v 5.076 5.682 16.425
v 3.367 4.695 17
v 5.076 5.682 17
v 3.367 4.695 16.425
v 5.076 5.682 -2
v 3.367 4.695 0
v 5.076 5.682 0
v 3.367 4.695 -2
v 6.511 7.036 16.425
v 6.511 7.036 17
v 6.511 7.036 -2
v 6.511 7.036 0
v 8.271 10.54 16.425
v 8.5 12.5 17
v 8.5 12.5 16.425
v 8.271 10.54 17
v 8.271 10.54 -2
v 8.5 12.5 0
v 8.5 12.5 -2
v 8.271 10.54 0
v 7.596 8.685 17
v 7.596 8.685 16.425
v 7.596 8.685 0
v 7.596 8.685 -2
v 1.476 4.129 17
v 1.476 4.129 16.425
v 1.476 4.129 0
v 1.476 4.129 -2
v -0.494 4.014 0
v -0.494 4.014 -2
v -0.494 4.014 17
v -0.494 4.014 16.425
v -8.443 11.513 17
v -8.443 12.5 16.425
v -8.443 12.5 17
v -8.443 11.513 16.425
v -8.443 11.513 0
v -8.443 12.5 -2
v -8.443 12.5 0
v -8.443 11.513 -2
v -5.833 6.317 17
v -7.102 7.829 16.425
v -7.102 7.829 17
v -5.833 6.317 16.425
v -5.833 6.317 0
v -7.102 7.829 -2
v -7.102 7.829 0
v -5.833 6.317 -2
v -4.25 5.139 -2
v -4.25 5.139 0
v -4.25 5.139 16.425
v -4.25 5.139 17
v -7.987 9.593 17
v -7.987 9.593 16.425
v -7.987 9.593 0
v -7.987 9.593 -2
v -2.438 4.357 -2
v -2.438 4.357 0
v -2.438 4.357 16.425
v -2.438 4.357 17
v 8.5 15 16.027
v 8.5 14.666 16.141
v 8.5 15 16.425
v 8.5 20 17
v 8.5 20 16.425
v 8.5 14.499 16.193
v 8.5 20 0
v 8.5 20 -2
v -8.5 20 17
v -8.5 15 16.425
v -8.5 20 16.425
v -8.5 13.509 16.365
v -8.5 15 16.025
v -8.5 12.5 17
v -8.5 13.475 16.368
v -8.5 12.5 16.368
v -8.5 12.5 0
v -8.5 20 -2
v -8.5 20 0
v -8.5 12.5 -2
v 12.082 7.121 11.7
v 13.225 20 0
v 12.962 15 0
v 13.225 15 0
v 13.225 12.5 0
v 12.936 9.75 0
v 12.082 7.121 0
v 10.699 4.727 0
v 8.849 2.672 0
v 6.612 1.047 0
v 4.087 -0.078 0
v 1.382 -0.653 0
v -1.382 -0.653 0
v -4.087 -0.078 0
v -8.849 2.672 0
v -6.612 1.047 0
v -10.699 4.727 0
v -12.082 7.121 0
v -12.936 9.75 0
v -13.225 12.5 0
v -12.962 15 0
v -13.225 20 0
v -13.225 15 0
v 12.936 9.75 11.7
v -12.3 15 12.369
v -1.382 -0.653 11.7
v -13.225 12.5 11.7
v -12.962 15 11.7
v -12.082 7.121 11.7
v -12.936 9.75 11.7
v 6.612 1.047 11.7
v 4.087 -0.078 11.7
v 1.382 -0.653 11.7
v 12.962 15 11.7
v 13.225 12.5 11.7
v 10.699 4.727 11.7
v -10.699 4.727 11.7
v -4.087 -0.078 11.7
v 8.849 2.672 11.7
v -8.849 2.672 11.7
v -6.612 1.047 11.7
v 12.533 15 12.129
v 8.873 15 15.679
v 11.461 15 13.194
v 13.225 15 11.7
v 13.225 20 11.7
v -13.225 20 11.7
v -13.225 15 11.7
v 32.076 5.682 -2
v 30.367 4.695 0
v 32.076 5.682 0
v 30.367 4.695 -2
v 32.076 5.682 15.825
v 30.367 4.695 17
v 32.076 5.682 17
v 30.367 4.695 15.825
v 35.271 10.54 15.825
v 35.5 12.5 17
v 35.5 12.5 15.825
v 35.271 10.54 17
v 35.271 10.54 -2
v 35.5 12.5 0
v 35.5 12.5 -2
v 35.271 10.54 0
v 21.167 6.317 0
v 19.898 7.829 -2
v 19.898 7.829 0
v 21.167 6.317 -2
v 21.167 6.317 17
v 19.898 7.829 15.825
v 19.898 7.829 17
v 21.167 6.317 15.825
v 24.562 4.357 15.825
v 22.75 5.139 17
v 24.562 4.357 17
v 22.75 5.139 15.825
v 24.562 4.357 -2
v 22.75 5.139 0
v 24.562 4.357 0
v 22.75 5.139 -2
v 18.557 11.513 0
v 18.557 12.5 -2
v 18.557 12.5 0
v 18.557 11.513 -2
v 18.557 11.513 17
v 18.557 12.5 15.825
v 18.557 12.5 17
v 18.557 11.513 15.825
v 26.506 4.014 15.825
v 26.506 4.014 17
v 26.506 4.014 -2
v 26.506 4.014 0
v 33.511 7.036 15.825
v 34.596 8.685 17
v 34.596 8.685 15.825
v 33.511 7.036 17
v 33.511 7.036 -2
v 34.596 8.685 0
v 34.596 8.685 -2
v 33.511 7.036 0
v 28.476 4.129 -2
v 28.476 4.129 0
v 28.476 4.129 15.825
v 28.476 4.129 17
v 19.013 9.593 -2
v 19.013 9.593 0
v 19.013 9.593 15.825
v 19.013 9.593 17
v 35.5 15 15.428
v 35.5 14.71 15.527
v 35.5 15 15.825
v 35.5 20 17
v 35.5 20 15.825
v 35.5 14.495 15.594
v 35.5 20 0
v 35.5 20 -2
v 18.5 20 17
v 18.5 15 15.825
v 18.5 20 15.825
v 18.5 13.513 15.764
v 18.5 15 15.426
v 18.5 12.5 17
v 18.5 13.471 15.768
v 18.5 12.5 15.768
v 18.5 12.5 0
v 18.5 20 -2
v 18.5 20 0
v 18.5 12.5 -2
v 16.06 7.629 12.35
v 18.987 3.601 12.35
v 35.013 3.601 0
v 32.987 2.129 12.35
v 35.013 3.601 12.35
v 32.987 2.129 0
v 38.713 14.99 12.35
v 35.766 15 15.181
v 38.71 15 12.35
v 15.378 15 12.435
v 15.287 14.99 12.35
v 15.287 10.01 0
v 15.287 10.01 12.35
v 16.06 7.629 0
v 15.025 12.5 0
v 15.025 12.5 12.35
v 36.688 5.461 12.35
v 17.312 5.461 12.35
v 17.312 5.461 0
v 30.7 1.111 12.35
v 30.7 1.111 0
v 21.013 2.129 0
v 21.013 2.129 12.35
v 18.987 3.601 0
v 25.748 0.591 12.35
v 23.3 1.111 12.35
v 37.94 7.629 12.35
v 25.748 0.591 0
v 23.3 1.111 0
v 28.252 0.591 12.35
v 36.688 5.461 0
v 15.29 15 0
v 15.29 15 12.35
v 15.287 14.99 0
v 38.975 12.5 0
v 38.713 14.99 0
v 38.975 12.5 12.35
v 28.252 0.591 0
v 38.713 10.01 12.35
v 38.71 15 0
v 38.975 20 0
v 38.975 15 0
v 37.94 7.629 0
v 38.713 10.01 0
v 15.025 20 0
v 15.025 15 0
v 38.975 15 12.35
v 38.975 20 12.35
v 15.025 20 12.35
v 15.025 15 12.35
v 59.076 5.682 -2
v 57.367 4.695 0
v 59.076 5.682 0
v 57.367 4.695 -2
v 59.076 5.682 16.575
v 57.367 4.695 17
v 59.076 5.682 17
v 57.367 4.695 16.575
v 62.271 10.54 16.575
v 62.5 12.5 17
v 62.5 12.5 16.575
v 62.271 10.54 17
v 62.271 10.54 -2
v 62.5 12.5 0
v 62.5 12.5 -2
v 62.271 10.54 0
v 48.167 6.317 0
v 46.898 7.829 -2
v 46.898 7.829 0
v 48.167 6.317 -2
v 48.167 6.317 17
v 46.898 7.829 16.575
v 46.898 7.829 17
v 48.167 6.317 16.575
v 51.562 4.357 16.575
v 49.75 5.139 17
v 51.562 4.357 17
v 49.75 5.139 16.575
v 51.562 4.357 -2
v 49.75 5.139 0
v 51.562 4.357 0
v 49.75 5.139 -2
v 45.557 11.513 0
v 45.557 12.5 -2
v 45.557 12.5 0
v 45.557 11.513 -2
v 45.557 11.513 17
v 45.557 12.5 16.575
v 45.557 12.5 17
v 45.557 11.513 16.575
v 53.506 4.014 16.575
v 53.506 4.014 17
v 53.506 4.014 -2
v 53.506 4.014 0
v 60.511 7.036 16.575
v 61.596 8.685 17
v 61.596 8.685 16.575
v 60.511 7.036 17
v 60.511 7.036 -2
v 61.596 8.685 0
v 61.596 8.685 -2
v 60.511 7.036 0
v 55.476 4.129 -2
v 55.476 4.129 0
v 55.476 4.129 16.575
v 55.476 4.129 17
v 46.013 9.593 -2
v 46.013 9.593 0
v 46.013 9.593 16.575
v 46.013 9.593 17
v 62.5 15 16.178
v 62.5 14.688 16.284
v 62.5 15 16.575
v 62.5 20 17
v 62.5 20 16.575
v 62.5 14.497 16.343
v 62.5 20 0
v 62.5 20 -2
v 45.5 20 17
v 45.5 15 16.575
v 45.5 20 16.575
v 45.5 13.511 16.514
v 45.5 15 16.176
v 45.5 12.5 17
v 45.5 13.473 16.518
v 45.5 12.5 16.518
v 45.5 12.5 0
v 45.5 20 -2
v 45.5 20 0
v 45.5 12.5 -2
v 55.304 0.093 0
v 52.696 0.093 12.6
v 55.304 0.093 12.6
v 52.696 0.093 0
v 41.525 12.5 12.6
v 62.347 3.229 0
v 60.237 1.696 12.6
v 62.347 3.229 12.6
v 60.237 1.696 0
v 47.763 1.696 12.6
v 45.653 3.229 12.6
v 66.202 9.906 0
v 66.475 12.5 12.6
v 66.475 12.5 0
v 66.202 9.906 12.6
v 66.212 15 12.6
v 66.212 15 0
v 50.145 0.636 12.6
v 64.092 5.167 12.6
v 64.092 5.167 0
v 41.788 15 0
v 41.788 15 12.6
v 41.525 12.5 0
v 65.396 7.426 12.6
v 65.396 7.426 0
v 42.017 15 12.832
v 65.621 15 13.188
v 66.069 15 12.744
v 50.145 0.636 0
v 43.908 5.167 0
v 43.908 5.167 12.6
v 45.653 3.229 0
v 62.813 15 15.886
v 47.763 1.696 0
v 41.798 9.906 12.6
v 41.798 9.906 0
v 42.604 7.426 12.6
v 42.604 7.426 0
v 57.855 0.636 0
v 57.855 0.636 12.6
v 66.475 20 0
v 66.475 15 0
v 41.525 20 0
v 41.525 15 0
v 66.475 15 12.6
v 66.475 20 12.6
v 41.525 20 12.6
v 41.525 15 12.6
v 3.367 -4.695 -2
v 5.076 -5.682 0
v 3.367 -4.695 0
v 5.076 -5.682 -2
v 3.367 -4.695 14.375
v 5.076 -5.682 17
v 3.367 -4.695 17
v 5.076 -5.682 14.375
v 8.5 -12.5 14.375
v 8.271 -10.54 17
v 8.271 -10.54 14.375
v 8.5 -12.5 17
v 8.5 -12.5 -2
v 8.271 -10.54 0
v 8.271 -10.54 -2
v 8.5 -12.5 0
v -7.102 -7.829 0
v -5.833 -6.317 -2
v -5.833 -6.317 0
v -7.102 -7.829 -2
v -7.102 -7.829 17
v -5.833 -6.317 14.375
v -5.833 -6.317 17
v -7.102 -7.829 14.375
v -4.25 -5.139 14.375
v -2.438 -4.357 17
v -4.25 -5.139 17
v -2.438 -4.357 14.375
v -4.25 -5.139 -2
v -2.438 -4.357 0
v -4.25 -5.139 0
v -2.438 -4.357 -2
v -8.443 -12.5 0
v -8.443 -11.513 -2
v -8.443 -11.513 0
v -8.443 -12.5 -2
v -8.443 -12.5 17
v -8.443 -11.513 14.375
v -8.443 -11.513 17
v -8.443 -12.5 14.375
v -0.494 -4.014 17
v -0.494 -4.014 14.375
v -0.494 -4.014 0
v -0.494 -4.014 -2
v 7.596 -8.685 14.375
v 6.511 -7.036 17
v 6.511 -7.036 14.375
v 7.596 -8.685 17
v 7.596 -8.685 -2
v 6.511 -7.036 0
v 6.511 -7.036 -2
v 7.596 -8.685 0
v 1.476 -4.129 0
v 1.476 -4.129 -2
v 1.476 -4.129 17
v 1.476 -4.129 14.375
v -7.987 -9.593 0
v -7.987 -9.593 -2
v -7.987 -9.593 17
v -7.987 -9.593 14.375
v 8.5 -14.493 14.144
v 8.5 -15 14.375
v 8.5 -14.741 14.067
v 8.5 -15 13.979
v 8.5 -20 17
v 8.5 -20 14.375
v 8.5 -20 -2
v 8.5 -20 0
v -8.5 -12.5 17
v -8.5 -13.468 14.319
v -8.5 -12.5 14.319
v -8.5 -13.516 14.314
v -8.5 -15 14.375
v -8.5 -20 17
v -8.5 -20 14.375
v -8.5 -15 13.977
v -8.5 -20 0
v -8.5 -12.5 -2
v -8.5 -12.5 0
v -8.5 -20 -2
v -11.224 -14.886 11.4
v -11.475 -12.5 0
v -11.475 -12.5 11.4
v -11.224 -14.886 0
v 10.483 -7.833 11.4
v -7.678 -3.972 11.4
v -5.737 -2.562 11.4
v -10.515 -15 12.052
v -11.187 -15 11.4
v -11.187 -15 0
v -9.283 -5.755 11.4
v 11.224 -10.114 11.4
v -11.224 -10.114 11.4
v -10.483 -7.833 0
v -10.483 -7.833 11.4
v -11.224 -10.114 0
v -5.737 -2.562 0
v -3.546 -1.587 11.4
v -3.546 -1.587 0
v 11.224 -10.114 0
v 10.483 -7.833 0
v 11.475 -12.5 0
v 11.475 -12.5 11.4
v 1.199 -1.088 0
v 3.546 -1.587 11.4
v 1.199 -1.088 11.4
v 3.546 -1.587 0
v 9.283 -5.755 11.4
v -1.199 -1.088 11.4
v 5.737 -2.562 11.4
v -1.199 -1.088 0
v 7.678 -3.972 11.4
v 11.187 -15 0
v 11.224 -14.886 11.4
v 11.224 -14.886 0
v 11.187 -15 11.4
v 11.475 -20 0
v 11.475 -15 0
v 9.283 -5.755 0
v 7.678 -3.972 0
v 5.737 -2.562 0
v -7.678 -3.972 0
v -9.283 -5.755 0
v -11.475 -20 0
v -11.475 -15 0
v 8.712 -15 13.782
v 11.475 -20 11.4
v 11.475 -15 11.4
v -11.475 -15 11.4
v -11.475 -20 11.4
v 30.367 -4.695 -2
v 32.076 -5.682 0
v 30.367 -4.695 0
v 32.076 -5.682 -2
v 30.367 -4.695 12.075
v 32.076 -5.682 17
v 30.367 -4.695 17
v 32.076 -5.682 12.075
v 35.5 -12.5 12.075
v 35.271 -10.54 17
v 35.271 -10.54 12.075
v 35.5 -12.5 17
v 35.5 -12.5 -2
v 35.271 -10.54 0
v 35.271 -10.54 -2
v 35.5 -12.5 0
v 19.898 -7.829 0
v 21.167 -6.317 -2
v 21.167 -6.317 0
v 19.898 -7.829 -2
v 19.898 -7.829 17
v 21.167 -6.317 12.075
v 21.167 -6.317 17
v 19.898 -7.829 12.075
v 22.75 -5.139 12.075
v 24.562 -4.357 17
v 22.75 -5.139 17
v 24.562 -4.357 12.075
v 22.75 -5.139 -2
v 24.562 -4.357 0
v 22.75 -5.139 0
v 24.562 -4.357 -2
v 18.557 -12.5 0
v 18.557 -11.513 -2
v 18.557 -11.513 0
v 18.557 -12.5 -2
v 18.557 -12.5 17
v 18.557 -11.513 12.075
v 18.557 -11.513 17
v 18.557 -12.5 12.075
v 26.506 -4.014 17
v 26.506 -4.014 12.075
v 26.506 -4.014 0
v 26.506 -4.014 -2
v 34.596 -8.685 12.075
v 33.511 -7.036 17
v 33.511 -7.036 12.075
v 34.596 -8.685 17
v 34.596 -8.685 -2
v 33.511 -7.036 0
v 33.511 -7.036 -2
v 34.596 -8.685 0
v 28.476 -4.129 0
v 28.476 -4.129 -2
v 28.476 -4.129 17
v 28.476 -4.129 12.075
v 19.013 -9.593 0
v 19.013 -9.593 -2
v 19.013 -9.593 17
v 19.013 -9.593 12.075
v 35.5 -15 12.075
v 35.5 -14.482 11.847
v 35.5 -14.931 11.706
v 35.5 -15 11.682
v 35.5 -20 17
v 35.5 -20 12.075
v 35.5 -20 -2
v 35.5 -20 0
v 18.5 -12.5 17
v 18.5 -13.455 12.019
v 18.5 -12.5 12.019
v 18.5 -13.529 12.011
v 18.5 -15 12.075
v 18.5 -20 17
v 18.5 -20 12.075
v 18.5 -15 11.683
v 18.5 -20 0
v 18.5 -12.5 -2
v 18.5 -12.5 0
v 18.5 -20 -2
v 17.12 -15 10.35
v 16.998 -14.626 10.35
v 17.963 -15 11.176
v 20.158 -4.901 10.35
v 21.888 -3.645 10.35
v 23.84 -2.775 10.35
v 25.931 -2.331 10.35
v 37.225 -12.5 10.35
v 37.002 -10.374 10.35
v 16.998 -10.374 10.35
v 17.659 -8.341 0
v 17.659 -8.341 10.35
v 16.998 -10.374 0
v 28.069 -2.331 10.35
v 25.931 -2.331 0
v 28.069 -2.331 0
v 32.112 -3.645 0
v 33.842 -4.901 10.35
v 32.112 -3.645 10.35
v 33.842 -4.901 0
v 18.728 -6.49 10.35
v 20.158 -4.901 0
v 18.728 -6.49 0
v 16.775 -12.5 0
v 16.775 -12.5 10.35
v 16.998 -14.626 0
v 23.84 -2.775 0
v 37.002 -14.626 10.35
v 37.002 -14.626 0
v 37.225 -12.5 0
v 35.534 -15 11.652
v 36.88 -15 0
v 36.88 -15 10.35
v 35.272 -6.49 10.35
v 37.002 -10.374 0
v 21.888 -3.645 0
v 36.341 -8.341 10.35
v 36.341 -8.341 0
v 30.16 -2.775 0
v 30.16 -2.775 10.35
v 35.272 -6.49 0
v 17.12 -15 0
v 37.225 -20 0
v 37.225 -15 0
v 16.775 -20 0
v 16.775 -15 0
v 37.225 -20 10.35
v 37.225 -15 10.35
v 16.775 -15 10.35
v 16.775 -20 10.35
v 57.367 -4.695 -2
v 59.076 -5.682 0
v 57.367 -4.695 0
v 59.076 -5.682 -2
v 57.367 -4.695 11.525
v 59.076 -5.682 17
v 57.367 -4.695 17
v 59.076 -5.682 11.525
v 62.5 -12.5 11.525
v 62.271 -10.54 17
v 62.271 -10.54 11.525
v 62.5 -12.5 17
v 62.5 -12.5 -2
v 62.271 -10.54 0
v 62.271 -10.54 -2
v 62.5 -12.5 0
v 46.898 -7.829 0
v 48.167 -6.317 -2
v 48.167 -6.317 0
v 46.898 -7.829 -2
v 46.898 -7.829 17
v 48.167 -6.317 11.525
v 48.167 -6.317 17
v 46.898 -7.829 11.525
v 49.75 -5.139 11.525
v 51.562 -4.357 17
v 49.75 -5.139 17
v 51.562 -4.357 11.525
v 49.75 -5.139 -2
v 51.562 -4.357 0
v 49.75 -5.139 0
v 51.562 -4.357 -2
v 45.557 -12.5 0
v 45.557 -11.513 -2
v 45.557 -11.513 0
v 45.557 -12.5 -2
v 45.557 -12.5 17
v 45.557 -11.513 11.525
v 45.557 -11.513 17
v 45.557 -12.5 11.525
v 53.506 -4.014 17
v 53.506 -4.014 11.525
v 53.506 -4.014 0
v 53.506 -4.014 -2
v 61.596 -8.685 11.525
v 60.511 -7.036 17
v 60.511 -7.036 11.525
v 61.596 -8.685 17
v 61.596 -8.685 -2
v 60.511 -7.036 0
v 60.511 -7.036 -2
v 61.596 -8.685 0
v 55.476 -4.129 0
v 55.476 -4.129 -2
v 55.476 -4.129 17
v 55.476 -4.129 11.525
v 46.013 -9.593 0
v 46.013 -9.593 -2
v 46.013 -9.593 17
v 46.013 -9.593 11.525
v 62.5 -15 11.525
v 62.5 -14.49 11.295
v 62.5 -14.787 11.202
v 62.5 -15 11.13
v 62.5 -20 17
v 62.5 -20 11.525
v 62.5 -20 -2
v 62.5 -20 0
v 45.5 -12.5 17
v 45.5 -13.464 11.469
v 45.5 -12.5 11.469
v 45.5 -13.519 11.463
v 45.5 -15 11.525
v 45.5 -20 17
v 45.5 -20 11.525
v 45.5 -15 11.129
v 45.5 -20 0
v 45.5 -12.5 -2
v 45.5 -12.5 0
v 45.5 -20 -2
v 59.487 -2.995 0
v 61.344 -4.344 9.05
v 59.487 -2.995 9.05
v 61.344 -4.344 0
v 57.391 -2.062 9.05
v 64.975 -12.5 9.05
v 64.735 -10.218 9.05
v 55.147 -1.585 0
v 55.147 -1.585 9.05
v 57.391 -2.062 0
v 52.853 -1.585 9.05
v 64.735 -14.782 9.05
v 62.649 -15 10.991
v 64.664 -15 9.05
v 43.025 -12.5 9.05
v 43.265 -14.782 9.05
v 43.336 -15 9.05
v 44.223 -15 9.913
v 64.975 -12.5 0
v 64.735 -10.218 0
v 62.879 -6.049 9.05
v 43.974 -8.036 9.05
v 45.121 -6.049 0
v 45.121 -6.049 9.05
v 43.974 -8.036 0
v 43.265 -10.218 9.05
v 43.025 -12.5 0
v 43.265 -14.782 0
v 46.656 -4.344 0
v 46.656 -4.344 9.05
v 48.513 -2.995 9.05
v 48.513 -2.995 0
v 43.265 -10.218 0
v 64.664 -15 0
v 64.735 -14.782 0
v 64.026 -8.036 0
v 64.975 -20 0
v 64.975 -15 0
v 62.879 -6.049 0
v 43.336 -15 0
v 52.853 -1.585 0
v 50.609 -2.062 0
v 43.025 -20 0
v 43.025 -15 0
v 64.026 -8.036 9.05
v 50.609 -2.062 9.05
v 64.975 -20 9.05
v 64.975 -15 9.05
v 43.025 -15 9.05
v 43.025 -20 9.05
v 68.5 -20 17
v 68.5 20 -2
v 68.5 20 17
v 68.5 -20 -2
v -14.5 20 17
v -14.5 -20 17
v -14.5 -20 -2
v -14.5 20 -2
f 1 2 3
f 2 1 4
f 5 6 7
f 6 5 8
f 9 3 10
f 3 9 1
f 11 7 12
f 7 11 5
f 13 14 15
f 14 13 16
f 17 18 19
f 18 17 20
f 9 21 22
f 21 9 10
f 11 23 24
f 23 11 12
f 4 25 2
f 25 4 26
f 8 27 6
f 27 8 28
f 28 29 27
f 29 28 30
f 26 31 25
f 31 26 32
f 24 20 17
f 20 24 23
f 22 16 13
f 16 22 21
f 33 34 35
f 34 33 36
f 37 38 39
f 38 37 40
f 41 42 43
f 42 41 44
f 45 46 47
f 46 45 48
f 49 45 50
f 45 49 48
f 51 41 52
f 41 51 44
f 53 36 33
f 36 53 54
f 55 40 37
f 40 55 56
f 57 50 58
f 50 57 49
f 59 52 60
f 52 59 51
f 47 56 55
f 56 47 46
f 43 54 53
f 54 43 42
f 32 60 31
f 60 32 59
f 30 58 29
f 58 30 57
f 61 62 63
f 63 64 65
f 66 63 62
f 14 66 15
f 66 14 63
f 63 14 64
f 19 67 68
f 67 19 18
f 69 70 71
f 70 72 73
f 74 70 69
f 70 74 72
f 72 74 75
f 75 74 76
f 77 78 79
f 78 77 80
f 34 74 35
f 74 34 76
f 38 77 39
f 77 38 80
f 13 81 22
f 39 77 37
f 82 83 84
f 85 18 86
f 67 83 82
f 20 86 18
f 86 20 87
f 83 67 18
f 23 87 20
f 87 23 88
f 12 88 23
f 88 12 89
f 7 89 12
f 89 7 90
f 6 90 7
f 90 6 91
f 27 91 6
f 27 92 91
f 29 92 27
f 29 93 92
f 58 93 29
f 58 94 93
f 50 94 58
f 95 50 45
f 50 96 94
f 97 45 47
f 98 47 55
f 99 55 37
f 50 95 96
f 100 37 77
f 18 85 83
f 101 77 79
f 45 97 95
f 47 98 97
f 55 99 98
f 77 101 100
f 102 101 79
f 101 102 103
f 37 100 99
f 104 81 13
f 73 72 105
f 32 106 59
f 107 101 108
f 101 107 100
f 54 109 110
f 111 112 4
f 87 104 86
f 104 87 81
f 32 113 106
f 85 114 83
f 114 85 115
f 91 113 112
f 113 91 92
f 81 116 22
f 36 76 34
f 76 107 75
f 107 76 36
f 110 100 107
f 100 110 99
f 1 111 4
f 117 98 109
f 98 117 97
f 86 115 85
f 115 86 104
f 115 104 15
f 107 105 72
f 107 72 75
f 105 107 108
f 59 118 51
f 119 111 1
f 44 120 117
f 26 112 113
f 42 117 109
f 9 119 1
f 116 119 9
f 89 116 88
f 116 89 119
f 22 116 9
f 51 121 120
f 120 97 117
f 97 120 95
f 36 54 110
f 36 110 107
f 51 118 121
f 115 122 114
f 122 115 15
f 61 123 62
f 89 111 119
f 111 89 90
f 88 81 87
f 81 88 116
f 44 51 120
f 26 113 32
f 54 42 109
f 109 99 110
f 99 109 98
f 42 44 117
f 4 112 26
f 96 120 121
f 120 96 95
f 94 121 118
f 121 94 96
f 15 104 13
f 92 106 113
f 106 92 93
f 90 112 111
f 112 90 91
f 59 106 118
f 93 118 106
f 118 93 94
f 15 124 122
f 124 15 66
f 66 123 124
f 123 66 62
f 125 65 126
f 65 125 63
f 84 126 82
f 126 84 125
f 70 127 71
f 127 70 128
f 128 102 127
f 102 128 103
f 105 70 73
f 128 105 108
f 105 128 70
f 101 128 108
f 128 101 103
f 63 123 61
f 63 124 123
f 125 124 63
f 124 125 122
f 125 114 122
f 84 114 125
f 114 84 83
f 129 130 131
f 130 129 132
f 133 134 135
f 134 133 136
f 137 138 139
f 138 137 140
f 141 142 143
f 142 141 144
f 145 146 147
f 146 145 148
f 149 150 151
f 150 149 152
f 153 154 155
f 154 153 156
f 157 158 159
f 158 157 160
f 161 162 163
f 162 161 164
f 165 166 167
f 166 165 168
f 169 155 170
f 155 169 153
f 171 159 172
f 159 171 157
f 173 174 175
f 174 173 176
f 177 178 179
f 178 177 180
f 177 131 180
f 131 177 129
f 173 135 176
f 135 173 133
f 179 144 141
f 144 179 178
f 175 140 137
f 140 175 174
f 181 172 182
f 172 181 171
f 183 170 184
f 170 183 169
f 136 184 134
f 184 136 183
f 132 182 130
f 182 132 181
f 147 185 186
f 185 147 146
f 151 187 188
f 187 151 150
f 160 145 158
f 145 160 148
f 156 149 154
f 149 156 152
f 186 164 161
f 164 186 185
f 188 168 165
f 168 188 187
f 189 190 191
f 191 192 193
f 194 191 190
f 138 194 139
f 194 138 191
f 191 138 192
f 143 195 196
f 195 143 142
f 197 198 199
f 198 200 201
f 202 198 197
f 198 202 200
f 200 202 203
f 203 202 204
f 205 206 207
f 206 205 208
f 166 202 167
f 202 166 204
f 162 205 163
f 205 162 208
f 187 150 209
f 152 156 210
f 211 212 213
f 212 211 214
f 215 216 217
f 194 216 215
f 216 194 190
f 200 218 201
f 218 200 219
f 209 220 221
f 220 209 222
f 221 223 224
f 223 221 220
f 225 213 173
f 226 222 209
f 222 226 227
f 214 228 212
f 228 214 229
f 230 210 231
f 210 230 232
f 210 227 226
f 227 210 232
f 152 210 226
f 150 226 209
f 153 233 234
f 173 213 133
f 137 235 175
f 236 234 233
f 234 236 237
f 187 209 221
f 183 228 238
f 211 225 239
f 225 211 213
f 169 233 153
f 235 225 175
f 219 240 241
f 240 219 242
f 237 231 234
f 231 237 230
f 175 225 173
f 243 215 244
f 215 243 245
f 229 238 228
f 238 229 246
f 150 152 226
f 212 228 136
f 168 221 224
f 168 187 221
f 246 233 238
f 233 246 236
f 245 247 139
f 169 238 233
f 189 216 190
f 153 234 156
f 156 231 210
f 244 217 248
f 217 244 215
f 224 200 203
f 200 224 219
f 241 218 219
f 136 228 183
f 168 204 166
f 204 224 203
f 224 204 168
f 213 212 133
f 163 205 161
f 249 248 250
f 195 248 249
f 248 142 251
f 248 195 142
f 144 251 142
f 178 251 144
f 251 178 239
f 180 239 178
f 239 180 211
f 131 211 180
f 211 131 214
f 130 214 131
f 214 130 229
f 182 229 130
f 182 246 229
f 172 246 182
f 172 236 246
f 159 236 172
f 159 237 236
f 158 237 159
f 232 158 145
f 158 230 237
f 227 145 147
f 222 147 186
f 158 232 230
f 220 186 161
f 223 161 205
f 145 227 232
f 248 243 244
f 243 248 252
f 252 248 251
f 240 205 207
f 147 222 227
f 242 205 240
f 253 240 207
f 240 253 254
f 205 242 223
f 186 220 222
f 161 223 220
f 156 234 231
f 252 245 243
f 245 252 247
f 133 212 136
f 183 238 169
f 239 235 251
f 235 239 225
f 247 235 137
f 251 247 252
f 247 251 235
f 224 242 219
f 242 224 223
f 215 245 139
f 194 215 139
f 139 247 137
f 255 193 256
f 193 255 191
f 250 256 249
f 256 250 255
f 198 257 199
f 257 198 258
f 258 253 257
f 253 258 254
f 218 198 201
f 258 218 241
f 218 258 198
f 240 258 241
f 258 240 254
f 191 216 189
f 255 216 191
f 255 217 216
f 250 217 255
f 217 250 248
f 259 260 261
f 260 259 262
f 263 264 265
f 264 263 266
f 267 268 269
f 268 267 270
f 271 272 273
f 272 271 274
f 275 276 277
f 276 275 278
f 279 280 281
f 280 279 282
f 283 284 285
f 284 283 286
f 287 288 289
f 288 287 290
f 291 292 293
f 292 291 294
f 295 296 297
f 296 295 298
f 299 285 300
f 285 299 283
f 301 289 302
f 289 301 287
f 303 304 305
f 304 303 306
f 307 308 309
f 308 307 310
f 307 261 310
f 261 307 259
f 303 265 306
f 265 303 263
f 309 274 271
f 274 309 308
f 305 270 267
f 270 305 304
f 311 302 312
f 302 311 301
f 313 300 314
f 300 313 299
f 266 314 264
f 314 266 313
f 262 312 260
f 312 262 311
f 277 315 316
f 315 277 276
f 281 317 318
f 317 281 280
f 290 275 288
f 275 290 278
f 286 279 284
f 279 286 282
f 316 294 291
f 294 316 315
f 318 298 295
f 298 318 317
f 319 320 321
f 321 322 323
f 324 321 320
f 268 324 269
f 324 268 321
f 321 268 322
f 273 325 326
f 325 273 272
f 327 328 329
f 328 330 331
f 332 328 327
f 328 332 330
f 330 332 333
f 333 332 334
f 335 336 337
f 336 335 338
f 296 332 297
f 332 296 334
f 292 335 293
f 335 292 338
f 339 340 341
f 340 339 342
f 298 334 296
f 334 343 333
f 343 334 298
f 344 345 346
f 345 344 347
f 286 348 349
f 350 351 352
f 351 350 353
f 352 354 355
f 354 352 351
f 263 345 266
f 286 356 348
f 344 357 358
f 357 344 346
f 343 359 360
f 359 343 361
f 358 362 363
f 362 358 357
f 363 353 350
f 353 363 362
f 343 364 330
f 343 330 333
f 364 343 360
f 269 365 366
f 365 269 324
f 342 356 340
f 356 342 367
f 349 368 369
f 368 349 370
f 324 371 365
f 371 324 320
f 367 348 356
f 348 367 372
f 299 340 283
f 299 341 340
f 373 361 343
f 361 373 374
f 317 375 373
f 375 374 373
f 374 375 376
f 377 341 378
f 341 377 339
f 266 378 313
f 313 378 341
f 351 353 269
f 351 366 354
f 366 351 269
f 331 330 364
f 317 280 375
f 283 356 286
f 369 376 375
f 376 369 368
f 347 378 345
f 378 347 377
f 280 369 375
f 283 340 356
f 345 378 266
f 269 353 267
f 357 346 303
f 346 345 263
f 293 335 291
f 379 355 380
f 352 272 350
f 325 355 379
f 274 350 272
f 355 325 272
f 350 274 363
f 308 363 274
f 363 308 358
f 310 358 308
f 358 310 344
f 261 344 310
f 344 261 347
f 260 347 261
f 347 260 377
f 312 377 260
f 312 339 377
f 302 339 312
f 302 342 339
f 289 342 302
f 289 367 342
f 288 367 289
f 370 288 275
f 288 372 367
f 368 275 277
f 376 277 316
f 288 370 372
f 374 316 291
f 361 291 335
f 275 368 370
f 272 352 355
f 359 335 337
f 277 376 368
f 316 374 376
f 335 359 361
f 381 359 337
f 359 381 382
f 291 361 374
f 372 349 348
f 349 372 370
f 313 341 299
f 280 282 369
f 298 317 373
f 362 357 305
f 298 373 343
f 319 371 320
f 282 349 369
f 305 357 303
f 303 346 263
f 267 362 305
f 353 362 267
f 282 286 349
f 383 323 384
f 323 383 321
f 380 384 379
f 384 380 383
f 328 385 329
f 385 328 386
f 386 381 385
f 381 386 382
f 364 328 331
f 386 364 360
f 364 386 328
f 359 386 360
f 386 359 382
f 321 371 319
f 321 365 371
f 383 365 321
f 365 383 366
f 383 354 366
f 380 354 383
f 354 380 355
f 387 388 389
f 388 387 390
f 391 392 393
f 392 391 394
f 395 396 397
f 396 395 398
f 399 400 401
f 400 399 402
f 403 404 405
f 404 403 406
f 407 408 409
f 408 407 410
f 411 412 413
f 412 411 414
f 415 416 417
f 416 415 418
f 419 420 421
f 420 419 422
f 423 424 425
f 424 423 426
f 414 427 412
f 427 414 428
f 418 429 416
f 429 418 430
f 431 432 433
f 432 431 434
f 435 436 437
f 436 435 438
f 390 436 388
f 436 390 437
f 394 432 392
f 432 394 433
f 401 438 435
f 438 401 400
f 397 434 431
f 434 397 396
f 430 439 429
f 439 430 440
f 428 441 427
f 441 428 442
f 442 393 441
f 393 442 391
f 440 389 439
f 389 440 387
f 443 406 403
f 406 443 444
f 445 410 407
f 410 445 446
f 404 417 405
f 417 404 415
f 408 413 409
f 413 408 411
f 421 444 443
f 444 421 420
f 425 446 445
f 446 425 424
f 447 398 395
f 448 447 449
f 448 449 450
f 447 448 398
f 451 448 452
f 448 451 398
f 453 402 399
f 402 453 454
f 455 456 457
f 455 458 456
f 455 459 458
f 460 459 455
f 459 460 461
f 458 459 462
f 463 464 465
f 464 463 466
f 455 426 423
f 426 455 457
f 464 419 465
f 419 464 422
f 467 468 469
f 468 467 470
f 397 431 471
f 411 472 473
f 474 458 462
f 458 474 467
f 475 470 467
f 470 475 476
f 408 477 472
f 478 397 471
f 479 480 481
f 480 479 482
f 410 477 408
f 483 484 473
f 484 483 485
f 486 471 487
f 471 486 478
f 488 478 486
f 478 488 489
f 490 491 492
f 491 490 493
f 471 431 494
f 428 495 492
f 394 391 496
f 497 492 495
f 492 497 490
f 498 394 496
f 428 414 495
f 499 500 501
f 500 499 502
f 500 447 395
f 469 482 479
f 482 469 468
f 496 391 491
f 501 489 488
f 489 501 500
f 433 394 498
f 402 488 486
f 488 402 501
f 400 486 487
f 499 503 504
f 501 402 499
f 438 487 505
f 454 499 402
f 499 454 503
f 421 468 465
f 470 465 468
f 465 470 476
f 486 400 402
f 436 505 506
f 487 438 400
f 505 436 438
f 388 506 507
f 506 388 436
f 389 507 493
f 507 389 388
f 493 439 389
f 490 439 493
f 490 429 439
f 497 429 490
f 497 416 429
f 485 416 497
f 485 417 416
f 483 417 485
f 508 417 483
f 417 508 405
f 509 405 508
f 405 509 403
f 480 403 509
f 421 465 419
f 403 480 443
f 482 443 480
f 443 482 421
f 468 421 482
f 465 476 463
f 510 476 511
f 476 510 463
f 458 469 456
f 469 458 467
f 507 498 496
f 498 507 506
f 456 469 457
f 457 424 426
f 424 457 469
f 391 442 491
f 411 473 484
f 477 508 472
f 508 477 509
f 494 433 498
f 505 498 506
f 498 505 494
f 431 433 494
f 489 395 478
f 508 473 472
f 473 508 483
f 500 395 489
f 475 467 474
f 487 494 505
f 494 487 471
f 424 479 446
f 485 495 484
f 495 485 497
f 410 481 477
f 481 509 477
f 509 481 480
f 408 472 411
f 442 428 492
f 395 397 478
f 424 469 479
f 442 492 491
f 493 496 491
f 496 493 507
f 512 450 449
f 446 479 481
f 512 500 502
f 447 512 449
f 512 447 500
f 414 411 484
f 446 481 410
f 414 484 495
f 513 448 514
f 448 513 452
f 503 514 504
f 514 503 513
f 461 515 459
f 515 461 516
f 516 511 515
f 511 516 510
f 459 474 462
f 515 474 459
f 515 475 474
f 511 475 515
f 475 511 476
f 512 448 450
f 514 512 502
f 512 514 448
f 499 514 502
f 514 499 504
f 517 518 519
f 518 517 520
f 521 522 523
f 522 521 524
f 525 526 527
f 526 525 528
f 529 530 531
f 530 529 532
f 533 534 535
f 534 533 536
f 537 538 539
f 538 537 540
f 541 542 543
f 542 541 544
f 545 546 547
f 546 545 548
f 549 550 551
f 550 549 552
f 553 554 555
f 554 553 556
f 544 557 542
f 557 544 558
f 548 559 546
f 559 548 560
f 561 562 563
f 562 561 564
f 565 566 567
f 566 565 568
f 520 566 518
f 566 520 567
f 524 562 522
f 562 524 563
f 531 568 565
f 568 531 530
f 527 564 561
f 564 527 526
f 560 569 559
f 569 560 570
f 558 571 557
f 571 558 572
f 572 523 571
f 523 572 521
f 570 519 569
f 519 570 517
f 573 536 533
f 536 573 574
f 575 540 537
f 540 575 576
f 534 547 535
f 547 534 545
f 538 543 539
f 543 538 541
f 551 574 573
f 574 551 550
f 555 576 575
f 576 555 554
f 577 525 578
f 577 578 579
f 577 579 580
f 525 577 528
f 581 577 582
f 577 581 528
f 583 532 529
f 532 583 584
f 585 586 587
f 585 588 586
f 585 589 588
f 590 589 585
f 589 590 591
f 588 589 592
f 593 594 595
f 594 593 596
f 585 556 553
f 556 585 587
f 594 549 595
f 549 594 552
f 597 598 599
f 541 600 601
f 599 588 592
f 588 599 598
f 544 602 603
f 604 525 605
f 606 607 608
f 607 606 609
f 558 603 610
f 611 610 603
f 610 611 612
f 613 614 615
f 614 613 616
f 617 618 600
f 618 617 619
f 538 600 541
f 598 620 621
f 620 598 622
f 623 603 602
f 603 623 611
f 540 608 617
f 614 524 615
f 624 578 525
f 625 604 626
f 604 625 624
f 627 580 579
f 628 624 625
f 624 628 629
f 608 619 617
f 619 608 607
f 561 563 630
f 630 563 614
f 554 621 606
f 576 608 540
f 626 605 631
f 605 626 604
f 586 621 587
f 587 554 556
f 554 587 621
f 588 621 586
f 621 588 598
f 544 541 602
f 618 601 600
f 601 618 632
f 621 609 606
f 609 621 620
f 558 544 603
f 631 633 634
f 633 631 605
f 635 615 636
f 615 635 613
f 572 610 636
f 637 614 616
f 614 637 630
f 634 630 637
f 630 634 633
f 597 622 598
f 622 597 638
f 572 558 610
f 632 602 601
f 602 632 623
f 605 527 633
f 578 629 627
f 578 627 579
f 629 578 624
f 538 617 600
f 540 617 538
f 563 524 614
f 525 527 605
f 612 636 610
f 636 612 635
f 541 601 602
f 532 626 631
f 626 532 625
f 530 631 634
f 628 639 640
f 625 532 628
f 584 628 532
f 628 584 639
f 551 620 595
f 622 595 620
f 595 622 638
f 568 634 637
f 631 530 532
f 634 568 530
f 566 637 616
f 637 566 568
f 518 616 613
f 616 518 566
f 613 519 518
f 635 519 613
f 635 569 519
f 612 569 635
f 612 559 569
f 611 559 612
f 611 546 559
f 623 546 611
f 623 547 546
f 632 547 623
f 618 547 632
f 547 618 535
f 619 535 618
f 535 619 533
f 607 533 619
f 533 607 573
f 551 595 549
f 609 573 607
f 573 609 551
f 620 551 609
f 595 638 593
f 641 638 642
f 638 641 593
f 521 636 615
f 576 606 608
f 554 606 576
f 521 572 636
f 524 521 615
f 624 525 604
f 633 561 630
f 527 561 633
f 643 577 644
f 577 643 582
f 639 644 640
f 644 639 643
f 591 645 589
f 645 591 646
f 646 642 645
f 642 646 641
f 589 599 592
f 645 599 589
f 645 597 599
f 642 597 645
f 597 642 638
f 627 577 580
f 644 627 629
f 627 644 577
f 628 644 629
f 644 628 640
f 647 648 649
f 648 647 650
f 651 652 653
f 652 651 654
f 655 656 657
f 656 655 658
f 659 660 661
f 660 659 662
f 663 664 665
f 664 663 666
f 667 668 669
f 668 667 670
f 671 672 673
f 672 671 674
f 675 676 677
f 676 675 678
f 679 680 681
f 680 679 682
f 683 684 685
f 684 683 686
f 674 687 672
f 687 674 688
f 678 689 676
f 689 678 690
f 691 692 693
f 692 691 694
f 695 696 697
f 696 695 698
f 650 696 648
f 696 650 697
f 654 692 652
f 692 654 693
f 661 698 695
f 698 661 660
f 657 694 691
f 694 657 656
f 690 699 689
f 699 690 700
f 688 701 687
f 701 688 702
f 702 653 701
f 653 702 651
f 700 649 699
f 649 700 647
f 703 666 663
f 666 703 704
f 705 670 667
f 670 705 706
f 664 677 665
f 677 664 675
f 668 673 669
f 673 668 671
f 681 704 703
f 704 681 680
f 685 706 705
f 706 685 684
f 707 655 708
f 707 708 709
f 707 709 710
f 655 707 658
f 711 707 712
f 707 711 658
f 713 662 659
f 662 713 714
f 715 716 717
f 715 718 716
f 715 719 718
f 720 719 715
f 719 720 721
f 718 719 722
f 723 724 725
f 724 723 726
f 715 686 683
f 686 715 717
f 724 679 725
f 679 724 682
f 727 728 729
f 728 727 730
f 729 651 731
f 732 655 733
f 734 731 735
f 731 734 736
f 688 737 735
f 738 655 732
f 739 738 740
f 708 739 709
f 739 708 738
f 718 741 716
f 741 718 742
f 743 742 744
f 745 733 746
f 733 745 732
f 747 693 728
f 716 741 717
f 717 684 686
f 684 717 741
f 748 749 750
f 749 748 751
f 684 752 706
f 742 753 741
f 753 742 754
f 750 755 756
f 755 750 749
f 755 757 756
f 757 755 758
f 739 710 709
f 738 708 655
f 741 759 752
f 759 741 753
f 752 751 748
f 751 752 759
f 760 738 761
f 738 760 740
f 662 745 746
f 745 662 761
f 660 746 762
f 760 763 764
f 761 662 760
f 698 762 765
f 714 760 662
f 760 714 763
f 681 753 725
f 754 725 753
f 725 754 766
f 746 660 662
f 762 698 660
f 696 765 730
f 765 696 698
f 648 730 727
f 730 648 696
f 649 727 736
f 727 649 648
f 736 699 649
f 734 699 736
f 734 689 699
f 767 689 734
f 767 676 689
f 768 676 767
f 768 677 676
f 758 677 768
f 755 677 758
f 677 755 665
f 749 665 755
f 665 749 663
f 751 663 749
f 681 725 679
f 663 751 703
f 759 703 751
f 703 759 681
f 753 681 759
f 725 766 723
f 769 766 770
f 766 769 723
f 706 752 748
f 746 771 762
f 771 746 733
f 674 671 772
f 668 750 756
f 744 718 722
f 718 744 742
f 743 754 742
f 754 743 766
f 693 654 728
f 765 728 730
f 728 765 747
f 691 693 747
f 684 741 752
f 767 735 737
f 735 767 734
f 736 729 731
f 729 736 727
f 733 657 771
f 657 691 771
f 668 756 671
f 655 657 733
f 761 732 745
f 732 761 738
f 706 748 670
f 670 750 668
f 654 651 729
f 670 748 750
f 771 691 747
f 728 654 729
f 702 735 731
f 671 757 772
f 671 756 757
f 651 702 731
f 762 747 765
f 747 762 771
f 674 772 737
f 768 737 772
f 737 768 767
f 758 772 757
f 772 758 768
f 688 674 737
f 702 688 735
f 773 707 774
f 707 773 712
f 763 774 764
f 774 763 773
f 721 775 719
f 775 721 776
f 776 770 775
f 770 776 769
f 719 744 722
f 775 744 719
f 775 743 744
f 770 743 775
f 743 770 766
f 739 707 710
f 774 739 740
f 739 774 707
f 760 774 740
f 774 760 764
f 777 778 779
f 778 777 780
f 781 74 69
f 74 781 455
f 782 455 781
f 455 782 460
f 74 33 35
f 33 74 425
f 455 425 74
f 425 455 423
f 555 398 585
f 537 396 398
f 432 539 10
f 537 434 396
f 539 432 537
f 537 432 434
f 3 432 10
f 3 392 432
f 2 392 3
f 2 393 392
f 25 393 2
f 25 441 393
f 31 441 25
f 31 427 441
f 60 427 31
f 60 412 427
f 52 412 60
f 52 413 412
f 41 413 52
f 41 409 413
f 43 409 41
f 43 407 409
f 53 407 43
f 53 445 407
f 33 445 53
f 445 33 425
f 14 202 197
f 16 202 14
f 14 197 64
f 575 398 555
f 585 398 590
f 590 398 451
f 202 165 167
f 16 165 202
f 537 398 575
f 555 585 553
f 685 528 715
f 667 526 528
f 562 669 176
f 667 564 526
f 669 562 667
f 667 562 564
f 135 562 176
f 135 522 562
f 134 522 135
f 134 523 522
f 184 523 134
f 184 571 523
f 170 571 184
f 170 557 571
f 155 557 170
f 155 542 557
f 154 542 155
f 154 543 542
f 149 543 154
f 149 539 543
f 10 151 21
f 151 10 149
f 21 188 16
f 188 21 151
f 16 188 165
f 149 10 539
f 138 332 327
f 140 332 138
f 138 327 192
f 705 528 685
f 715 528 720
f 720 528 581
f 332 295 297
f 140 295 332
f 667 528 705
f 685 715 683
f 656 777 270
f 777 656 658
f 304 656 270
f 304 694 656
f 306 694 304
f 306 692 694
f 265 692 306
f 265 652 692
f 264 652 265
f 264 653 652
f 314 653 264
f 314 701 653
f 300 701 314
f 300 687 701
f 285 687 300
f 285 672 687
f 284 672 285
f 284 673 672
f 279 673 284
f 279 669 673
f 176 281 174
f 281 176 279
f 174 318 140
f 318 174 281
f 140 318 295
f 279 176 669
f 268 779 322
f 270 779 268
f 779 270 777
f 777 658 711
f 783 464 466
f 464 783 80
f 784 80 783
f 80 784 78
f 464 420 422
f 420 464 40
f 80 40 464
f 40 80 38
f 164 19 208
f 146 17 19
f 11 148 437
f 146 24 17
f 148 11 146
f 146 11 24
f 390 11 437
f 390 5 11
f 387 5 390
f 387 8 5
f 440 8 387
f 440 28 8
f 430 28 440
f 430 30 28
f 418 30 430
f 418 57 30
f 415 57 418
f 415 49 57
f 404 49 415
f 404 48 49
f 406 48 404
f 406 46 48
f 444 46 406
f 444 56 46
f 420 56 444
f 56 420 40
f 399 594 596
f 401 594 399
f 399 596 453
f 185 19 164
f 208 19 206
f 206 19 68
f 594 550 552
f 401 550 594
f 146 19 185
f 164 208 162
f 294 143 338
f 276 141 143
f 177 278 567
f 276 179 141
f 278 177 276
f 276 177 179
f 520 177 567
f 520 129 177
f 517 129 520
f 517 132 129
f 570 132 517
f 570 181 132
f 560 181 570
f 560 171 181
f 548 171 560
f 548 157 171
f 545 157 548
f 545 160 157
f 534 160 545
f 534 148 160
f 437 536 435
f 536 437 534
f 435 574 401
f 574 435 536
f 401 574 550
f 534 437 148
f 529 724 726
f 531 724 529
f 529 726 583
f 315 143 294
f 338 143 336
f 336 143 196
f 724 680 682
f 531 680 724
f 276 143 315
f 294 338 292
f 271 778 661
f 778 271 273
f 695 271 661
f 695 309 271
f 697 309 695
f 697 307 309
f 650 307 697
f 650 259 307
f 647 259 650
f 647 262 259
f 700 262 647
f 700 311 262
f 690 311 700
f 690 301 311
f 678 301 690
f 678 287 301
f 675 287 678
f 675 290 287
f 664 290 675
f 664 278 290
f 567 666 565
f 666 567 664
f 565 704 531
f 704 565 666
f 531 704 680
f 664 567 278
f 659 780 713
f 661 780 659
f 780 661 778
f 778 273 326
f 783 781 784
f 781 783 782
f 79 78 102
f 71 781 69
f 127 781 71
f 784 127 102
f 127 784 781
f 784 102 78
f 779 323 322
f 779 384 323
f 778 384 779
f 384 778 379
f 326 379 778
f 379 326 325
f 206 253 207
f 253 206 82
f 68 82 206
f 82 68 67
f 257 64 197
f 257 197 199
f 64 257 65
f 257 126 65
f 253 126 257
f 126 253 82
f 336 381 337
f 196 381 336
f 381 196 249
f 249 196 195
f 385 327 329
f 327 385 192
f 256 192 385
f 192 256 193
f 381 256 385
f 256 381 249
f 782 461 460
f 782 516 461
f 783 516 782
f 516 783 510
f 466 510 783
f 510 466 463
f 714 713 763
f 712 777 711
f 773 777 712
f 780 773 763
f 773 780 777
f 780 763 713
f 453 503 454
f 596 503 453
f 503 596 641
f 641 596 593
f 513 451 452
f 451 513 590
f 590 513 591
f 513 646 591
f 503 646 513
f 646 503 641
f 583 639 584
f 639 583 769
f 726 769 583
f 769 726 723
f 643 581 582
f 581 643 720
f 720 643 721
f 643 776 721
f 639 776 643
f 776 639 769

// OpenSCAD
coin_holder();

module coin_holder() {
    distance=27;
    width=40;
    mirror_distance=12.5;
    tolerance=0.7;
    holder=2.5;
    window=17;
    
    difference() {
        translate([-distance/2-1,-width/2,-2])
            cube([distance*3+2, width, 19], false);
        
        translate([0,mirror_distance,0]) coin_slot(25.75, 2.20, 5, window, holder, tolerance); // 2 Euro
        translate([distance,mirror_distance,0]) coin_slot(23.25, 2.33, 5, window, holder, tolerance); // 1 Euro
        translate([distance*2,mirror_distance,0]) coin_slot(24.25, 2.38, 5, window, holder, tolerance); // 0.5 Euro
        mirror([0,1,0]) {
            translate([0,mirror_distance,0]) coin_slot(22.25, 2.14, 5, window, holder, tolerance); // 0.2 Euro
            translate([distance,mirror_distance,0]) coin_slot(19.75, 1.93, 5, window, holder, tolerance); // 0.1 Euro
            #translate([distance*2,mirror_distance,0]) coin_slot(21.25, 1.67, 5, window, holder, tolerance); // 0.05 Euro
        }
        
    }
}

module coin_slot(diameter, height, stack, window, holder, tolerance) {
space=10;
    hull() {
    cylinder(h=height*stack+tolerance, d=diameter+tolerance, center=false);
    cylinder(h=height*stack+tolerance+(diameter+tolerance-window)/2, d=window, center=false);
    }
translate([-(diameter+tolerance)/2,holder,0]) 
    hull() {
    cube([diameter+tolerance, diameter/2-holder, height*stack+tolerance], false);
    translate([(diameter+tolerance-window)/2,0,0]) cube([window, diameter/2-holder, height*stack+tolerance+(diameter+tolerance-window)/2], false);
    }

translate([0,0,-space]) {
    cylinder(h=height*stack+space*2, d=window, center=false);
    translate([-window/2, 0,0]) 
        cube([window, window/2, height*stack+space*2], false);
}

}
